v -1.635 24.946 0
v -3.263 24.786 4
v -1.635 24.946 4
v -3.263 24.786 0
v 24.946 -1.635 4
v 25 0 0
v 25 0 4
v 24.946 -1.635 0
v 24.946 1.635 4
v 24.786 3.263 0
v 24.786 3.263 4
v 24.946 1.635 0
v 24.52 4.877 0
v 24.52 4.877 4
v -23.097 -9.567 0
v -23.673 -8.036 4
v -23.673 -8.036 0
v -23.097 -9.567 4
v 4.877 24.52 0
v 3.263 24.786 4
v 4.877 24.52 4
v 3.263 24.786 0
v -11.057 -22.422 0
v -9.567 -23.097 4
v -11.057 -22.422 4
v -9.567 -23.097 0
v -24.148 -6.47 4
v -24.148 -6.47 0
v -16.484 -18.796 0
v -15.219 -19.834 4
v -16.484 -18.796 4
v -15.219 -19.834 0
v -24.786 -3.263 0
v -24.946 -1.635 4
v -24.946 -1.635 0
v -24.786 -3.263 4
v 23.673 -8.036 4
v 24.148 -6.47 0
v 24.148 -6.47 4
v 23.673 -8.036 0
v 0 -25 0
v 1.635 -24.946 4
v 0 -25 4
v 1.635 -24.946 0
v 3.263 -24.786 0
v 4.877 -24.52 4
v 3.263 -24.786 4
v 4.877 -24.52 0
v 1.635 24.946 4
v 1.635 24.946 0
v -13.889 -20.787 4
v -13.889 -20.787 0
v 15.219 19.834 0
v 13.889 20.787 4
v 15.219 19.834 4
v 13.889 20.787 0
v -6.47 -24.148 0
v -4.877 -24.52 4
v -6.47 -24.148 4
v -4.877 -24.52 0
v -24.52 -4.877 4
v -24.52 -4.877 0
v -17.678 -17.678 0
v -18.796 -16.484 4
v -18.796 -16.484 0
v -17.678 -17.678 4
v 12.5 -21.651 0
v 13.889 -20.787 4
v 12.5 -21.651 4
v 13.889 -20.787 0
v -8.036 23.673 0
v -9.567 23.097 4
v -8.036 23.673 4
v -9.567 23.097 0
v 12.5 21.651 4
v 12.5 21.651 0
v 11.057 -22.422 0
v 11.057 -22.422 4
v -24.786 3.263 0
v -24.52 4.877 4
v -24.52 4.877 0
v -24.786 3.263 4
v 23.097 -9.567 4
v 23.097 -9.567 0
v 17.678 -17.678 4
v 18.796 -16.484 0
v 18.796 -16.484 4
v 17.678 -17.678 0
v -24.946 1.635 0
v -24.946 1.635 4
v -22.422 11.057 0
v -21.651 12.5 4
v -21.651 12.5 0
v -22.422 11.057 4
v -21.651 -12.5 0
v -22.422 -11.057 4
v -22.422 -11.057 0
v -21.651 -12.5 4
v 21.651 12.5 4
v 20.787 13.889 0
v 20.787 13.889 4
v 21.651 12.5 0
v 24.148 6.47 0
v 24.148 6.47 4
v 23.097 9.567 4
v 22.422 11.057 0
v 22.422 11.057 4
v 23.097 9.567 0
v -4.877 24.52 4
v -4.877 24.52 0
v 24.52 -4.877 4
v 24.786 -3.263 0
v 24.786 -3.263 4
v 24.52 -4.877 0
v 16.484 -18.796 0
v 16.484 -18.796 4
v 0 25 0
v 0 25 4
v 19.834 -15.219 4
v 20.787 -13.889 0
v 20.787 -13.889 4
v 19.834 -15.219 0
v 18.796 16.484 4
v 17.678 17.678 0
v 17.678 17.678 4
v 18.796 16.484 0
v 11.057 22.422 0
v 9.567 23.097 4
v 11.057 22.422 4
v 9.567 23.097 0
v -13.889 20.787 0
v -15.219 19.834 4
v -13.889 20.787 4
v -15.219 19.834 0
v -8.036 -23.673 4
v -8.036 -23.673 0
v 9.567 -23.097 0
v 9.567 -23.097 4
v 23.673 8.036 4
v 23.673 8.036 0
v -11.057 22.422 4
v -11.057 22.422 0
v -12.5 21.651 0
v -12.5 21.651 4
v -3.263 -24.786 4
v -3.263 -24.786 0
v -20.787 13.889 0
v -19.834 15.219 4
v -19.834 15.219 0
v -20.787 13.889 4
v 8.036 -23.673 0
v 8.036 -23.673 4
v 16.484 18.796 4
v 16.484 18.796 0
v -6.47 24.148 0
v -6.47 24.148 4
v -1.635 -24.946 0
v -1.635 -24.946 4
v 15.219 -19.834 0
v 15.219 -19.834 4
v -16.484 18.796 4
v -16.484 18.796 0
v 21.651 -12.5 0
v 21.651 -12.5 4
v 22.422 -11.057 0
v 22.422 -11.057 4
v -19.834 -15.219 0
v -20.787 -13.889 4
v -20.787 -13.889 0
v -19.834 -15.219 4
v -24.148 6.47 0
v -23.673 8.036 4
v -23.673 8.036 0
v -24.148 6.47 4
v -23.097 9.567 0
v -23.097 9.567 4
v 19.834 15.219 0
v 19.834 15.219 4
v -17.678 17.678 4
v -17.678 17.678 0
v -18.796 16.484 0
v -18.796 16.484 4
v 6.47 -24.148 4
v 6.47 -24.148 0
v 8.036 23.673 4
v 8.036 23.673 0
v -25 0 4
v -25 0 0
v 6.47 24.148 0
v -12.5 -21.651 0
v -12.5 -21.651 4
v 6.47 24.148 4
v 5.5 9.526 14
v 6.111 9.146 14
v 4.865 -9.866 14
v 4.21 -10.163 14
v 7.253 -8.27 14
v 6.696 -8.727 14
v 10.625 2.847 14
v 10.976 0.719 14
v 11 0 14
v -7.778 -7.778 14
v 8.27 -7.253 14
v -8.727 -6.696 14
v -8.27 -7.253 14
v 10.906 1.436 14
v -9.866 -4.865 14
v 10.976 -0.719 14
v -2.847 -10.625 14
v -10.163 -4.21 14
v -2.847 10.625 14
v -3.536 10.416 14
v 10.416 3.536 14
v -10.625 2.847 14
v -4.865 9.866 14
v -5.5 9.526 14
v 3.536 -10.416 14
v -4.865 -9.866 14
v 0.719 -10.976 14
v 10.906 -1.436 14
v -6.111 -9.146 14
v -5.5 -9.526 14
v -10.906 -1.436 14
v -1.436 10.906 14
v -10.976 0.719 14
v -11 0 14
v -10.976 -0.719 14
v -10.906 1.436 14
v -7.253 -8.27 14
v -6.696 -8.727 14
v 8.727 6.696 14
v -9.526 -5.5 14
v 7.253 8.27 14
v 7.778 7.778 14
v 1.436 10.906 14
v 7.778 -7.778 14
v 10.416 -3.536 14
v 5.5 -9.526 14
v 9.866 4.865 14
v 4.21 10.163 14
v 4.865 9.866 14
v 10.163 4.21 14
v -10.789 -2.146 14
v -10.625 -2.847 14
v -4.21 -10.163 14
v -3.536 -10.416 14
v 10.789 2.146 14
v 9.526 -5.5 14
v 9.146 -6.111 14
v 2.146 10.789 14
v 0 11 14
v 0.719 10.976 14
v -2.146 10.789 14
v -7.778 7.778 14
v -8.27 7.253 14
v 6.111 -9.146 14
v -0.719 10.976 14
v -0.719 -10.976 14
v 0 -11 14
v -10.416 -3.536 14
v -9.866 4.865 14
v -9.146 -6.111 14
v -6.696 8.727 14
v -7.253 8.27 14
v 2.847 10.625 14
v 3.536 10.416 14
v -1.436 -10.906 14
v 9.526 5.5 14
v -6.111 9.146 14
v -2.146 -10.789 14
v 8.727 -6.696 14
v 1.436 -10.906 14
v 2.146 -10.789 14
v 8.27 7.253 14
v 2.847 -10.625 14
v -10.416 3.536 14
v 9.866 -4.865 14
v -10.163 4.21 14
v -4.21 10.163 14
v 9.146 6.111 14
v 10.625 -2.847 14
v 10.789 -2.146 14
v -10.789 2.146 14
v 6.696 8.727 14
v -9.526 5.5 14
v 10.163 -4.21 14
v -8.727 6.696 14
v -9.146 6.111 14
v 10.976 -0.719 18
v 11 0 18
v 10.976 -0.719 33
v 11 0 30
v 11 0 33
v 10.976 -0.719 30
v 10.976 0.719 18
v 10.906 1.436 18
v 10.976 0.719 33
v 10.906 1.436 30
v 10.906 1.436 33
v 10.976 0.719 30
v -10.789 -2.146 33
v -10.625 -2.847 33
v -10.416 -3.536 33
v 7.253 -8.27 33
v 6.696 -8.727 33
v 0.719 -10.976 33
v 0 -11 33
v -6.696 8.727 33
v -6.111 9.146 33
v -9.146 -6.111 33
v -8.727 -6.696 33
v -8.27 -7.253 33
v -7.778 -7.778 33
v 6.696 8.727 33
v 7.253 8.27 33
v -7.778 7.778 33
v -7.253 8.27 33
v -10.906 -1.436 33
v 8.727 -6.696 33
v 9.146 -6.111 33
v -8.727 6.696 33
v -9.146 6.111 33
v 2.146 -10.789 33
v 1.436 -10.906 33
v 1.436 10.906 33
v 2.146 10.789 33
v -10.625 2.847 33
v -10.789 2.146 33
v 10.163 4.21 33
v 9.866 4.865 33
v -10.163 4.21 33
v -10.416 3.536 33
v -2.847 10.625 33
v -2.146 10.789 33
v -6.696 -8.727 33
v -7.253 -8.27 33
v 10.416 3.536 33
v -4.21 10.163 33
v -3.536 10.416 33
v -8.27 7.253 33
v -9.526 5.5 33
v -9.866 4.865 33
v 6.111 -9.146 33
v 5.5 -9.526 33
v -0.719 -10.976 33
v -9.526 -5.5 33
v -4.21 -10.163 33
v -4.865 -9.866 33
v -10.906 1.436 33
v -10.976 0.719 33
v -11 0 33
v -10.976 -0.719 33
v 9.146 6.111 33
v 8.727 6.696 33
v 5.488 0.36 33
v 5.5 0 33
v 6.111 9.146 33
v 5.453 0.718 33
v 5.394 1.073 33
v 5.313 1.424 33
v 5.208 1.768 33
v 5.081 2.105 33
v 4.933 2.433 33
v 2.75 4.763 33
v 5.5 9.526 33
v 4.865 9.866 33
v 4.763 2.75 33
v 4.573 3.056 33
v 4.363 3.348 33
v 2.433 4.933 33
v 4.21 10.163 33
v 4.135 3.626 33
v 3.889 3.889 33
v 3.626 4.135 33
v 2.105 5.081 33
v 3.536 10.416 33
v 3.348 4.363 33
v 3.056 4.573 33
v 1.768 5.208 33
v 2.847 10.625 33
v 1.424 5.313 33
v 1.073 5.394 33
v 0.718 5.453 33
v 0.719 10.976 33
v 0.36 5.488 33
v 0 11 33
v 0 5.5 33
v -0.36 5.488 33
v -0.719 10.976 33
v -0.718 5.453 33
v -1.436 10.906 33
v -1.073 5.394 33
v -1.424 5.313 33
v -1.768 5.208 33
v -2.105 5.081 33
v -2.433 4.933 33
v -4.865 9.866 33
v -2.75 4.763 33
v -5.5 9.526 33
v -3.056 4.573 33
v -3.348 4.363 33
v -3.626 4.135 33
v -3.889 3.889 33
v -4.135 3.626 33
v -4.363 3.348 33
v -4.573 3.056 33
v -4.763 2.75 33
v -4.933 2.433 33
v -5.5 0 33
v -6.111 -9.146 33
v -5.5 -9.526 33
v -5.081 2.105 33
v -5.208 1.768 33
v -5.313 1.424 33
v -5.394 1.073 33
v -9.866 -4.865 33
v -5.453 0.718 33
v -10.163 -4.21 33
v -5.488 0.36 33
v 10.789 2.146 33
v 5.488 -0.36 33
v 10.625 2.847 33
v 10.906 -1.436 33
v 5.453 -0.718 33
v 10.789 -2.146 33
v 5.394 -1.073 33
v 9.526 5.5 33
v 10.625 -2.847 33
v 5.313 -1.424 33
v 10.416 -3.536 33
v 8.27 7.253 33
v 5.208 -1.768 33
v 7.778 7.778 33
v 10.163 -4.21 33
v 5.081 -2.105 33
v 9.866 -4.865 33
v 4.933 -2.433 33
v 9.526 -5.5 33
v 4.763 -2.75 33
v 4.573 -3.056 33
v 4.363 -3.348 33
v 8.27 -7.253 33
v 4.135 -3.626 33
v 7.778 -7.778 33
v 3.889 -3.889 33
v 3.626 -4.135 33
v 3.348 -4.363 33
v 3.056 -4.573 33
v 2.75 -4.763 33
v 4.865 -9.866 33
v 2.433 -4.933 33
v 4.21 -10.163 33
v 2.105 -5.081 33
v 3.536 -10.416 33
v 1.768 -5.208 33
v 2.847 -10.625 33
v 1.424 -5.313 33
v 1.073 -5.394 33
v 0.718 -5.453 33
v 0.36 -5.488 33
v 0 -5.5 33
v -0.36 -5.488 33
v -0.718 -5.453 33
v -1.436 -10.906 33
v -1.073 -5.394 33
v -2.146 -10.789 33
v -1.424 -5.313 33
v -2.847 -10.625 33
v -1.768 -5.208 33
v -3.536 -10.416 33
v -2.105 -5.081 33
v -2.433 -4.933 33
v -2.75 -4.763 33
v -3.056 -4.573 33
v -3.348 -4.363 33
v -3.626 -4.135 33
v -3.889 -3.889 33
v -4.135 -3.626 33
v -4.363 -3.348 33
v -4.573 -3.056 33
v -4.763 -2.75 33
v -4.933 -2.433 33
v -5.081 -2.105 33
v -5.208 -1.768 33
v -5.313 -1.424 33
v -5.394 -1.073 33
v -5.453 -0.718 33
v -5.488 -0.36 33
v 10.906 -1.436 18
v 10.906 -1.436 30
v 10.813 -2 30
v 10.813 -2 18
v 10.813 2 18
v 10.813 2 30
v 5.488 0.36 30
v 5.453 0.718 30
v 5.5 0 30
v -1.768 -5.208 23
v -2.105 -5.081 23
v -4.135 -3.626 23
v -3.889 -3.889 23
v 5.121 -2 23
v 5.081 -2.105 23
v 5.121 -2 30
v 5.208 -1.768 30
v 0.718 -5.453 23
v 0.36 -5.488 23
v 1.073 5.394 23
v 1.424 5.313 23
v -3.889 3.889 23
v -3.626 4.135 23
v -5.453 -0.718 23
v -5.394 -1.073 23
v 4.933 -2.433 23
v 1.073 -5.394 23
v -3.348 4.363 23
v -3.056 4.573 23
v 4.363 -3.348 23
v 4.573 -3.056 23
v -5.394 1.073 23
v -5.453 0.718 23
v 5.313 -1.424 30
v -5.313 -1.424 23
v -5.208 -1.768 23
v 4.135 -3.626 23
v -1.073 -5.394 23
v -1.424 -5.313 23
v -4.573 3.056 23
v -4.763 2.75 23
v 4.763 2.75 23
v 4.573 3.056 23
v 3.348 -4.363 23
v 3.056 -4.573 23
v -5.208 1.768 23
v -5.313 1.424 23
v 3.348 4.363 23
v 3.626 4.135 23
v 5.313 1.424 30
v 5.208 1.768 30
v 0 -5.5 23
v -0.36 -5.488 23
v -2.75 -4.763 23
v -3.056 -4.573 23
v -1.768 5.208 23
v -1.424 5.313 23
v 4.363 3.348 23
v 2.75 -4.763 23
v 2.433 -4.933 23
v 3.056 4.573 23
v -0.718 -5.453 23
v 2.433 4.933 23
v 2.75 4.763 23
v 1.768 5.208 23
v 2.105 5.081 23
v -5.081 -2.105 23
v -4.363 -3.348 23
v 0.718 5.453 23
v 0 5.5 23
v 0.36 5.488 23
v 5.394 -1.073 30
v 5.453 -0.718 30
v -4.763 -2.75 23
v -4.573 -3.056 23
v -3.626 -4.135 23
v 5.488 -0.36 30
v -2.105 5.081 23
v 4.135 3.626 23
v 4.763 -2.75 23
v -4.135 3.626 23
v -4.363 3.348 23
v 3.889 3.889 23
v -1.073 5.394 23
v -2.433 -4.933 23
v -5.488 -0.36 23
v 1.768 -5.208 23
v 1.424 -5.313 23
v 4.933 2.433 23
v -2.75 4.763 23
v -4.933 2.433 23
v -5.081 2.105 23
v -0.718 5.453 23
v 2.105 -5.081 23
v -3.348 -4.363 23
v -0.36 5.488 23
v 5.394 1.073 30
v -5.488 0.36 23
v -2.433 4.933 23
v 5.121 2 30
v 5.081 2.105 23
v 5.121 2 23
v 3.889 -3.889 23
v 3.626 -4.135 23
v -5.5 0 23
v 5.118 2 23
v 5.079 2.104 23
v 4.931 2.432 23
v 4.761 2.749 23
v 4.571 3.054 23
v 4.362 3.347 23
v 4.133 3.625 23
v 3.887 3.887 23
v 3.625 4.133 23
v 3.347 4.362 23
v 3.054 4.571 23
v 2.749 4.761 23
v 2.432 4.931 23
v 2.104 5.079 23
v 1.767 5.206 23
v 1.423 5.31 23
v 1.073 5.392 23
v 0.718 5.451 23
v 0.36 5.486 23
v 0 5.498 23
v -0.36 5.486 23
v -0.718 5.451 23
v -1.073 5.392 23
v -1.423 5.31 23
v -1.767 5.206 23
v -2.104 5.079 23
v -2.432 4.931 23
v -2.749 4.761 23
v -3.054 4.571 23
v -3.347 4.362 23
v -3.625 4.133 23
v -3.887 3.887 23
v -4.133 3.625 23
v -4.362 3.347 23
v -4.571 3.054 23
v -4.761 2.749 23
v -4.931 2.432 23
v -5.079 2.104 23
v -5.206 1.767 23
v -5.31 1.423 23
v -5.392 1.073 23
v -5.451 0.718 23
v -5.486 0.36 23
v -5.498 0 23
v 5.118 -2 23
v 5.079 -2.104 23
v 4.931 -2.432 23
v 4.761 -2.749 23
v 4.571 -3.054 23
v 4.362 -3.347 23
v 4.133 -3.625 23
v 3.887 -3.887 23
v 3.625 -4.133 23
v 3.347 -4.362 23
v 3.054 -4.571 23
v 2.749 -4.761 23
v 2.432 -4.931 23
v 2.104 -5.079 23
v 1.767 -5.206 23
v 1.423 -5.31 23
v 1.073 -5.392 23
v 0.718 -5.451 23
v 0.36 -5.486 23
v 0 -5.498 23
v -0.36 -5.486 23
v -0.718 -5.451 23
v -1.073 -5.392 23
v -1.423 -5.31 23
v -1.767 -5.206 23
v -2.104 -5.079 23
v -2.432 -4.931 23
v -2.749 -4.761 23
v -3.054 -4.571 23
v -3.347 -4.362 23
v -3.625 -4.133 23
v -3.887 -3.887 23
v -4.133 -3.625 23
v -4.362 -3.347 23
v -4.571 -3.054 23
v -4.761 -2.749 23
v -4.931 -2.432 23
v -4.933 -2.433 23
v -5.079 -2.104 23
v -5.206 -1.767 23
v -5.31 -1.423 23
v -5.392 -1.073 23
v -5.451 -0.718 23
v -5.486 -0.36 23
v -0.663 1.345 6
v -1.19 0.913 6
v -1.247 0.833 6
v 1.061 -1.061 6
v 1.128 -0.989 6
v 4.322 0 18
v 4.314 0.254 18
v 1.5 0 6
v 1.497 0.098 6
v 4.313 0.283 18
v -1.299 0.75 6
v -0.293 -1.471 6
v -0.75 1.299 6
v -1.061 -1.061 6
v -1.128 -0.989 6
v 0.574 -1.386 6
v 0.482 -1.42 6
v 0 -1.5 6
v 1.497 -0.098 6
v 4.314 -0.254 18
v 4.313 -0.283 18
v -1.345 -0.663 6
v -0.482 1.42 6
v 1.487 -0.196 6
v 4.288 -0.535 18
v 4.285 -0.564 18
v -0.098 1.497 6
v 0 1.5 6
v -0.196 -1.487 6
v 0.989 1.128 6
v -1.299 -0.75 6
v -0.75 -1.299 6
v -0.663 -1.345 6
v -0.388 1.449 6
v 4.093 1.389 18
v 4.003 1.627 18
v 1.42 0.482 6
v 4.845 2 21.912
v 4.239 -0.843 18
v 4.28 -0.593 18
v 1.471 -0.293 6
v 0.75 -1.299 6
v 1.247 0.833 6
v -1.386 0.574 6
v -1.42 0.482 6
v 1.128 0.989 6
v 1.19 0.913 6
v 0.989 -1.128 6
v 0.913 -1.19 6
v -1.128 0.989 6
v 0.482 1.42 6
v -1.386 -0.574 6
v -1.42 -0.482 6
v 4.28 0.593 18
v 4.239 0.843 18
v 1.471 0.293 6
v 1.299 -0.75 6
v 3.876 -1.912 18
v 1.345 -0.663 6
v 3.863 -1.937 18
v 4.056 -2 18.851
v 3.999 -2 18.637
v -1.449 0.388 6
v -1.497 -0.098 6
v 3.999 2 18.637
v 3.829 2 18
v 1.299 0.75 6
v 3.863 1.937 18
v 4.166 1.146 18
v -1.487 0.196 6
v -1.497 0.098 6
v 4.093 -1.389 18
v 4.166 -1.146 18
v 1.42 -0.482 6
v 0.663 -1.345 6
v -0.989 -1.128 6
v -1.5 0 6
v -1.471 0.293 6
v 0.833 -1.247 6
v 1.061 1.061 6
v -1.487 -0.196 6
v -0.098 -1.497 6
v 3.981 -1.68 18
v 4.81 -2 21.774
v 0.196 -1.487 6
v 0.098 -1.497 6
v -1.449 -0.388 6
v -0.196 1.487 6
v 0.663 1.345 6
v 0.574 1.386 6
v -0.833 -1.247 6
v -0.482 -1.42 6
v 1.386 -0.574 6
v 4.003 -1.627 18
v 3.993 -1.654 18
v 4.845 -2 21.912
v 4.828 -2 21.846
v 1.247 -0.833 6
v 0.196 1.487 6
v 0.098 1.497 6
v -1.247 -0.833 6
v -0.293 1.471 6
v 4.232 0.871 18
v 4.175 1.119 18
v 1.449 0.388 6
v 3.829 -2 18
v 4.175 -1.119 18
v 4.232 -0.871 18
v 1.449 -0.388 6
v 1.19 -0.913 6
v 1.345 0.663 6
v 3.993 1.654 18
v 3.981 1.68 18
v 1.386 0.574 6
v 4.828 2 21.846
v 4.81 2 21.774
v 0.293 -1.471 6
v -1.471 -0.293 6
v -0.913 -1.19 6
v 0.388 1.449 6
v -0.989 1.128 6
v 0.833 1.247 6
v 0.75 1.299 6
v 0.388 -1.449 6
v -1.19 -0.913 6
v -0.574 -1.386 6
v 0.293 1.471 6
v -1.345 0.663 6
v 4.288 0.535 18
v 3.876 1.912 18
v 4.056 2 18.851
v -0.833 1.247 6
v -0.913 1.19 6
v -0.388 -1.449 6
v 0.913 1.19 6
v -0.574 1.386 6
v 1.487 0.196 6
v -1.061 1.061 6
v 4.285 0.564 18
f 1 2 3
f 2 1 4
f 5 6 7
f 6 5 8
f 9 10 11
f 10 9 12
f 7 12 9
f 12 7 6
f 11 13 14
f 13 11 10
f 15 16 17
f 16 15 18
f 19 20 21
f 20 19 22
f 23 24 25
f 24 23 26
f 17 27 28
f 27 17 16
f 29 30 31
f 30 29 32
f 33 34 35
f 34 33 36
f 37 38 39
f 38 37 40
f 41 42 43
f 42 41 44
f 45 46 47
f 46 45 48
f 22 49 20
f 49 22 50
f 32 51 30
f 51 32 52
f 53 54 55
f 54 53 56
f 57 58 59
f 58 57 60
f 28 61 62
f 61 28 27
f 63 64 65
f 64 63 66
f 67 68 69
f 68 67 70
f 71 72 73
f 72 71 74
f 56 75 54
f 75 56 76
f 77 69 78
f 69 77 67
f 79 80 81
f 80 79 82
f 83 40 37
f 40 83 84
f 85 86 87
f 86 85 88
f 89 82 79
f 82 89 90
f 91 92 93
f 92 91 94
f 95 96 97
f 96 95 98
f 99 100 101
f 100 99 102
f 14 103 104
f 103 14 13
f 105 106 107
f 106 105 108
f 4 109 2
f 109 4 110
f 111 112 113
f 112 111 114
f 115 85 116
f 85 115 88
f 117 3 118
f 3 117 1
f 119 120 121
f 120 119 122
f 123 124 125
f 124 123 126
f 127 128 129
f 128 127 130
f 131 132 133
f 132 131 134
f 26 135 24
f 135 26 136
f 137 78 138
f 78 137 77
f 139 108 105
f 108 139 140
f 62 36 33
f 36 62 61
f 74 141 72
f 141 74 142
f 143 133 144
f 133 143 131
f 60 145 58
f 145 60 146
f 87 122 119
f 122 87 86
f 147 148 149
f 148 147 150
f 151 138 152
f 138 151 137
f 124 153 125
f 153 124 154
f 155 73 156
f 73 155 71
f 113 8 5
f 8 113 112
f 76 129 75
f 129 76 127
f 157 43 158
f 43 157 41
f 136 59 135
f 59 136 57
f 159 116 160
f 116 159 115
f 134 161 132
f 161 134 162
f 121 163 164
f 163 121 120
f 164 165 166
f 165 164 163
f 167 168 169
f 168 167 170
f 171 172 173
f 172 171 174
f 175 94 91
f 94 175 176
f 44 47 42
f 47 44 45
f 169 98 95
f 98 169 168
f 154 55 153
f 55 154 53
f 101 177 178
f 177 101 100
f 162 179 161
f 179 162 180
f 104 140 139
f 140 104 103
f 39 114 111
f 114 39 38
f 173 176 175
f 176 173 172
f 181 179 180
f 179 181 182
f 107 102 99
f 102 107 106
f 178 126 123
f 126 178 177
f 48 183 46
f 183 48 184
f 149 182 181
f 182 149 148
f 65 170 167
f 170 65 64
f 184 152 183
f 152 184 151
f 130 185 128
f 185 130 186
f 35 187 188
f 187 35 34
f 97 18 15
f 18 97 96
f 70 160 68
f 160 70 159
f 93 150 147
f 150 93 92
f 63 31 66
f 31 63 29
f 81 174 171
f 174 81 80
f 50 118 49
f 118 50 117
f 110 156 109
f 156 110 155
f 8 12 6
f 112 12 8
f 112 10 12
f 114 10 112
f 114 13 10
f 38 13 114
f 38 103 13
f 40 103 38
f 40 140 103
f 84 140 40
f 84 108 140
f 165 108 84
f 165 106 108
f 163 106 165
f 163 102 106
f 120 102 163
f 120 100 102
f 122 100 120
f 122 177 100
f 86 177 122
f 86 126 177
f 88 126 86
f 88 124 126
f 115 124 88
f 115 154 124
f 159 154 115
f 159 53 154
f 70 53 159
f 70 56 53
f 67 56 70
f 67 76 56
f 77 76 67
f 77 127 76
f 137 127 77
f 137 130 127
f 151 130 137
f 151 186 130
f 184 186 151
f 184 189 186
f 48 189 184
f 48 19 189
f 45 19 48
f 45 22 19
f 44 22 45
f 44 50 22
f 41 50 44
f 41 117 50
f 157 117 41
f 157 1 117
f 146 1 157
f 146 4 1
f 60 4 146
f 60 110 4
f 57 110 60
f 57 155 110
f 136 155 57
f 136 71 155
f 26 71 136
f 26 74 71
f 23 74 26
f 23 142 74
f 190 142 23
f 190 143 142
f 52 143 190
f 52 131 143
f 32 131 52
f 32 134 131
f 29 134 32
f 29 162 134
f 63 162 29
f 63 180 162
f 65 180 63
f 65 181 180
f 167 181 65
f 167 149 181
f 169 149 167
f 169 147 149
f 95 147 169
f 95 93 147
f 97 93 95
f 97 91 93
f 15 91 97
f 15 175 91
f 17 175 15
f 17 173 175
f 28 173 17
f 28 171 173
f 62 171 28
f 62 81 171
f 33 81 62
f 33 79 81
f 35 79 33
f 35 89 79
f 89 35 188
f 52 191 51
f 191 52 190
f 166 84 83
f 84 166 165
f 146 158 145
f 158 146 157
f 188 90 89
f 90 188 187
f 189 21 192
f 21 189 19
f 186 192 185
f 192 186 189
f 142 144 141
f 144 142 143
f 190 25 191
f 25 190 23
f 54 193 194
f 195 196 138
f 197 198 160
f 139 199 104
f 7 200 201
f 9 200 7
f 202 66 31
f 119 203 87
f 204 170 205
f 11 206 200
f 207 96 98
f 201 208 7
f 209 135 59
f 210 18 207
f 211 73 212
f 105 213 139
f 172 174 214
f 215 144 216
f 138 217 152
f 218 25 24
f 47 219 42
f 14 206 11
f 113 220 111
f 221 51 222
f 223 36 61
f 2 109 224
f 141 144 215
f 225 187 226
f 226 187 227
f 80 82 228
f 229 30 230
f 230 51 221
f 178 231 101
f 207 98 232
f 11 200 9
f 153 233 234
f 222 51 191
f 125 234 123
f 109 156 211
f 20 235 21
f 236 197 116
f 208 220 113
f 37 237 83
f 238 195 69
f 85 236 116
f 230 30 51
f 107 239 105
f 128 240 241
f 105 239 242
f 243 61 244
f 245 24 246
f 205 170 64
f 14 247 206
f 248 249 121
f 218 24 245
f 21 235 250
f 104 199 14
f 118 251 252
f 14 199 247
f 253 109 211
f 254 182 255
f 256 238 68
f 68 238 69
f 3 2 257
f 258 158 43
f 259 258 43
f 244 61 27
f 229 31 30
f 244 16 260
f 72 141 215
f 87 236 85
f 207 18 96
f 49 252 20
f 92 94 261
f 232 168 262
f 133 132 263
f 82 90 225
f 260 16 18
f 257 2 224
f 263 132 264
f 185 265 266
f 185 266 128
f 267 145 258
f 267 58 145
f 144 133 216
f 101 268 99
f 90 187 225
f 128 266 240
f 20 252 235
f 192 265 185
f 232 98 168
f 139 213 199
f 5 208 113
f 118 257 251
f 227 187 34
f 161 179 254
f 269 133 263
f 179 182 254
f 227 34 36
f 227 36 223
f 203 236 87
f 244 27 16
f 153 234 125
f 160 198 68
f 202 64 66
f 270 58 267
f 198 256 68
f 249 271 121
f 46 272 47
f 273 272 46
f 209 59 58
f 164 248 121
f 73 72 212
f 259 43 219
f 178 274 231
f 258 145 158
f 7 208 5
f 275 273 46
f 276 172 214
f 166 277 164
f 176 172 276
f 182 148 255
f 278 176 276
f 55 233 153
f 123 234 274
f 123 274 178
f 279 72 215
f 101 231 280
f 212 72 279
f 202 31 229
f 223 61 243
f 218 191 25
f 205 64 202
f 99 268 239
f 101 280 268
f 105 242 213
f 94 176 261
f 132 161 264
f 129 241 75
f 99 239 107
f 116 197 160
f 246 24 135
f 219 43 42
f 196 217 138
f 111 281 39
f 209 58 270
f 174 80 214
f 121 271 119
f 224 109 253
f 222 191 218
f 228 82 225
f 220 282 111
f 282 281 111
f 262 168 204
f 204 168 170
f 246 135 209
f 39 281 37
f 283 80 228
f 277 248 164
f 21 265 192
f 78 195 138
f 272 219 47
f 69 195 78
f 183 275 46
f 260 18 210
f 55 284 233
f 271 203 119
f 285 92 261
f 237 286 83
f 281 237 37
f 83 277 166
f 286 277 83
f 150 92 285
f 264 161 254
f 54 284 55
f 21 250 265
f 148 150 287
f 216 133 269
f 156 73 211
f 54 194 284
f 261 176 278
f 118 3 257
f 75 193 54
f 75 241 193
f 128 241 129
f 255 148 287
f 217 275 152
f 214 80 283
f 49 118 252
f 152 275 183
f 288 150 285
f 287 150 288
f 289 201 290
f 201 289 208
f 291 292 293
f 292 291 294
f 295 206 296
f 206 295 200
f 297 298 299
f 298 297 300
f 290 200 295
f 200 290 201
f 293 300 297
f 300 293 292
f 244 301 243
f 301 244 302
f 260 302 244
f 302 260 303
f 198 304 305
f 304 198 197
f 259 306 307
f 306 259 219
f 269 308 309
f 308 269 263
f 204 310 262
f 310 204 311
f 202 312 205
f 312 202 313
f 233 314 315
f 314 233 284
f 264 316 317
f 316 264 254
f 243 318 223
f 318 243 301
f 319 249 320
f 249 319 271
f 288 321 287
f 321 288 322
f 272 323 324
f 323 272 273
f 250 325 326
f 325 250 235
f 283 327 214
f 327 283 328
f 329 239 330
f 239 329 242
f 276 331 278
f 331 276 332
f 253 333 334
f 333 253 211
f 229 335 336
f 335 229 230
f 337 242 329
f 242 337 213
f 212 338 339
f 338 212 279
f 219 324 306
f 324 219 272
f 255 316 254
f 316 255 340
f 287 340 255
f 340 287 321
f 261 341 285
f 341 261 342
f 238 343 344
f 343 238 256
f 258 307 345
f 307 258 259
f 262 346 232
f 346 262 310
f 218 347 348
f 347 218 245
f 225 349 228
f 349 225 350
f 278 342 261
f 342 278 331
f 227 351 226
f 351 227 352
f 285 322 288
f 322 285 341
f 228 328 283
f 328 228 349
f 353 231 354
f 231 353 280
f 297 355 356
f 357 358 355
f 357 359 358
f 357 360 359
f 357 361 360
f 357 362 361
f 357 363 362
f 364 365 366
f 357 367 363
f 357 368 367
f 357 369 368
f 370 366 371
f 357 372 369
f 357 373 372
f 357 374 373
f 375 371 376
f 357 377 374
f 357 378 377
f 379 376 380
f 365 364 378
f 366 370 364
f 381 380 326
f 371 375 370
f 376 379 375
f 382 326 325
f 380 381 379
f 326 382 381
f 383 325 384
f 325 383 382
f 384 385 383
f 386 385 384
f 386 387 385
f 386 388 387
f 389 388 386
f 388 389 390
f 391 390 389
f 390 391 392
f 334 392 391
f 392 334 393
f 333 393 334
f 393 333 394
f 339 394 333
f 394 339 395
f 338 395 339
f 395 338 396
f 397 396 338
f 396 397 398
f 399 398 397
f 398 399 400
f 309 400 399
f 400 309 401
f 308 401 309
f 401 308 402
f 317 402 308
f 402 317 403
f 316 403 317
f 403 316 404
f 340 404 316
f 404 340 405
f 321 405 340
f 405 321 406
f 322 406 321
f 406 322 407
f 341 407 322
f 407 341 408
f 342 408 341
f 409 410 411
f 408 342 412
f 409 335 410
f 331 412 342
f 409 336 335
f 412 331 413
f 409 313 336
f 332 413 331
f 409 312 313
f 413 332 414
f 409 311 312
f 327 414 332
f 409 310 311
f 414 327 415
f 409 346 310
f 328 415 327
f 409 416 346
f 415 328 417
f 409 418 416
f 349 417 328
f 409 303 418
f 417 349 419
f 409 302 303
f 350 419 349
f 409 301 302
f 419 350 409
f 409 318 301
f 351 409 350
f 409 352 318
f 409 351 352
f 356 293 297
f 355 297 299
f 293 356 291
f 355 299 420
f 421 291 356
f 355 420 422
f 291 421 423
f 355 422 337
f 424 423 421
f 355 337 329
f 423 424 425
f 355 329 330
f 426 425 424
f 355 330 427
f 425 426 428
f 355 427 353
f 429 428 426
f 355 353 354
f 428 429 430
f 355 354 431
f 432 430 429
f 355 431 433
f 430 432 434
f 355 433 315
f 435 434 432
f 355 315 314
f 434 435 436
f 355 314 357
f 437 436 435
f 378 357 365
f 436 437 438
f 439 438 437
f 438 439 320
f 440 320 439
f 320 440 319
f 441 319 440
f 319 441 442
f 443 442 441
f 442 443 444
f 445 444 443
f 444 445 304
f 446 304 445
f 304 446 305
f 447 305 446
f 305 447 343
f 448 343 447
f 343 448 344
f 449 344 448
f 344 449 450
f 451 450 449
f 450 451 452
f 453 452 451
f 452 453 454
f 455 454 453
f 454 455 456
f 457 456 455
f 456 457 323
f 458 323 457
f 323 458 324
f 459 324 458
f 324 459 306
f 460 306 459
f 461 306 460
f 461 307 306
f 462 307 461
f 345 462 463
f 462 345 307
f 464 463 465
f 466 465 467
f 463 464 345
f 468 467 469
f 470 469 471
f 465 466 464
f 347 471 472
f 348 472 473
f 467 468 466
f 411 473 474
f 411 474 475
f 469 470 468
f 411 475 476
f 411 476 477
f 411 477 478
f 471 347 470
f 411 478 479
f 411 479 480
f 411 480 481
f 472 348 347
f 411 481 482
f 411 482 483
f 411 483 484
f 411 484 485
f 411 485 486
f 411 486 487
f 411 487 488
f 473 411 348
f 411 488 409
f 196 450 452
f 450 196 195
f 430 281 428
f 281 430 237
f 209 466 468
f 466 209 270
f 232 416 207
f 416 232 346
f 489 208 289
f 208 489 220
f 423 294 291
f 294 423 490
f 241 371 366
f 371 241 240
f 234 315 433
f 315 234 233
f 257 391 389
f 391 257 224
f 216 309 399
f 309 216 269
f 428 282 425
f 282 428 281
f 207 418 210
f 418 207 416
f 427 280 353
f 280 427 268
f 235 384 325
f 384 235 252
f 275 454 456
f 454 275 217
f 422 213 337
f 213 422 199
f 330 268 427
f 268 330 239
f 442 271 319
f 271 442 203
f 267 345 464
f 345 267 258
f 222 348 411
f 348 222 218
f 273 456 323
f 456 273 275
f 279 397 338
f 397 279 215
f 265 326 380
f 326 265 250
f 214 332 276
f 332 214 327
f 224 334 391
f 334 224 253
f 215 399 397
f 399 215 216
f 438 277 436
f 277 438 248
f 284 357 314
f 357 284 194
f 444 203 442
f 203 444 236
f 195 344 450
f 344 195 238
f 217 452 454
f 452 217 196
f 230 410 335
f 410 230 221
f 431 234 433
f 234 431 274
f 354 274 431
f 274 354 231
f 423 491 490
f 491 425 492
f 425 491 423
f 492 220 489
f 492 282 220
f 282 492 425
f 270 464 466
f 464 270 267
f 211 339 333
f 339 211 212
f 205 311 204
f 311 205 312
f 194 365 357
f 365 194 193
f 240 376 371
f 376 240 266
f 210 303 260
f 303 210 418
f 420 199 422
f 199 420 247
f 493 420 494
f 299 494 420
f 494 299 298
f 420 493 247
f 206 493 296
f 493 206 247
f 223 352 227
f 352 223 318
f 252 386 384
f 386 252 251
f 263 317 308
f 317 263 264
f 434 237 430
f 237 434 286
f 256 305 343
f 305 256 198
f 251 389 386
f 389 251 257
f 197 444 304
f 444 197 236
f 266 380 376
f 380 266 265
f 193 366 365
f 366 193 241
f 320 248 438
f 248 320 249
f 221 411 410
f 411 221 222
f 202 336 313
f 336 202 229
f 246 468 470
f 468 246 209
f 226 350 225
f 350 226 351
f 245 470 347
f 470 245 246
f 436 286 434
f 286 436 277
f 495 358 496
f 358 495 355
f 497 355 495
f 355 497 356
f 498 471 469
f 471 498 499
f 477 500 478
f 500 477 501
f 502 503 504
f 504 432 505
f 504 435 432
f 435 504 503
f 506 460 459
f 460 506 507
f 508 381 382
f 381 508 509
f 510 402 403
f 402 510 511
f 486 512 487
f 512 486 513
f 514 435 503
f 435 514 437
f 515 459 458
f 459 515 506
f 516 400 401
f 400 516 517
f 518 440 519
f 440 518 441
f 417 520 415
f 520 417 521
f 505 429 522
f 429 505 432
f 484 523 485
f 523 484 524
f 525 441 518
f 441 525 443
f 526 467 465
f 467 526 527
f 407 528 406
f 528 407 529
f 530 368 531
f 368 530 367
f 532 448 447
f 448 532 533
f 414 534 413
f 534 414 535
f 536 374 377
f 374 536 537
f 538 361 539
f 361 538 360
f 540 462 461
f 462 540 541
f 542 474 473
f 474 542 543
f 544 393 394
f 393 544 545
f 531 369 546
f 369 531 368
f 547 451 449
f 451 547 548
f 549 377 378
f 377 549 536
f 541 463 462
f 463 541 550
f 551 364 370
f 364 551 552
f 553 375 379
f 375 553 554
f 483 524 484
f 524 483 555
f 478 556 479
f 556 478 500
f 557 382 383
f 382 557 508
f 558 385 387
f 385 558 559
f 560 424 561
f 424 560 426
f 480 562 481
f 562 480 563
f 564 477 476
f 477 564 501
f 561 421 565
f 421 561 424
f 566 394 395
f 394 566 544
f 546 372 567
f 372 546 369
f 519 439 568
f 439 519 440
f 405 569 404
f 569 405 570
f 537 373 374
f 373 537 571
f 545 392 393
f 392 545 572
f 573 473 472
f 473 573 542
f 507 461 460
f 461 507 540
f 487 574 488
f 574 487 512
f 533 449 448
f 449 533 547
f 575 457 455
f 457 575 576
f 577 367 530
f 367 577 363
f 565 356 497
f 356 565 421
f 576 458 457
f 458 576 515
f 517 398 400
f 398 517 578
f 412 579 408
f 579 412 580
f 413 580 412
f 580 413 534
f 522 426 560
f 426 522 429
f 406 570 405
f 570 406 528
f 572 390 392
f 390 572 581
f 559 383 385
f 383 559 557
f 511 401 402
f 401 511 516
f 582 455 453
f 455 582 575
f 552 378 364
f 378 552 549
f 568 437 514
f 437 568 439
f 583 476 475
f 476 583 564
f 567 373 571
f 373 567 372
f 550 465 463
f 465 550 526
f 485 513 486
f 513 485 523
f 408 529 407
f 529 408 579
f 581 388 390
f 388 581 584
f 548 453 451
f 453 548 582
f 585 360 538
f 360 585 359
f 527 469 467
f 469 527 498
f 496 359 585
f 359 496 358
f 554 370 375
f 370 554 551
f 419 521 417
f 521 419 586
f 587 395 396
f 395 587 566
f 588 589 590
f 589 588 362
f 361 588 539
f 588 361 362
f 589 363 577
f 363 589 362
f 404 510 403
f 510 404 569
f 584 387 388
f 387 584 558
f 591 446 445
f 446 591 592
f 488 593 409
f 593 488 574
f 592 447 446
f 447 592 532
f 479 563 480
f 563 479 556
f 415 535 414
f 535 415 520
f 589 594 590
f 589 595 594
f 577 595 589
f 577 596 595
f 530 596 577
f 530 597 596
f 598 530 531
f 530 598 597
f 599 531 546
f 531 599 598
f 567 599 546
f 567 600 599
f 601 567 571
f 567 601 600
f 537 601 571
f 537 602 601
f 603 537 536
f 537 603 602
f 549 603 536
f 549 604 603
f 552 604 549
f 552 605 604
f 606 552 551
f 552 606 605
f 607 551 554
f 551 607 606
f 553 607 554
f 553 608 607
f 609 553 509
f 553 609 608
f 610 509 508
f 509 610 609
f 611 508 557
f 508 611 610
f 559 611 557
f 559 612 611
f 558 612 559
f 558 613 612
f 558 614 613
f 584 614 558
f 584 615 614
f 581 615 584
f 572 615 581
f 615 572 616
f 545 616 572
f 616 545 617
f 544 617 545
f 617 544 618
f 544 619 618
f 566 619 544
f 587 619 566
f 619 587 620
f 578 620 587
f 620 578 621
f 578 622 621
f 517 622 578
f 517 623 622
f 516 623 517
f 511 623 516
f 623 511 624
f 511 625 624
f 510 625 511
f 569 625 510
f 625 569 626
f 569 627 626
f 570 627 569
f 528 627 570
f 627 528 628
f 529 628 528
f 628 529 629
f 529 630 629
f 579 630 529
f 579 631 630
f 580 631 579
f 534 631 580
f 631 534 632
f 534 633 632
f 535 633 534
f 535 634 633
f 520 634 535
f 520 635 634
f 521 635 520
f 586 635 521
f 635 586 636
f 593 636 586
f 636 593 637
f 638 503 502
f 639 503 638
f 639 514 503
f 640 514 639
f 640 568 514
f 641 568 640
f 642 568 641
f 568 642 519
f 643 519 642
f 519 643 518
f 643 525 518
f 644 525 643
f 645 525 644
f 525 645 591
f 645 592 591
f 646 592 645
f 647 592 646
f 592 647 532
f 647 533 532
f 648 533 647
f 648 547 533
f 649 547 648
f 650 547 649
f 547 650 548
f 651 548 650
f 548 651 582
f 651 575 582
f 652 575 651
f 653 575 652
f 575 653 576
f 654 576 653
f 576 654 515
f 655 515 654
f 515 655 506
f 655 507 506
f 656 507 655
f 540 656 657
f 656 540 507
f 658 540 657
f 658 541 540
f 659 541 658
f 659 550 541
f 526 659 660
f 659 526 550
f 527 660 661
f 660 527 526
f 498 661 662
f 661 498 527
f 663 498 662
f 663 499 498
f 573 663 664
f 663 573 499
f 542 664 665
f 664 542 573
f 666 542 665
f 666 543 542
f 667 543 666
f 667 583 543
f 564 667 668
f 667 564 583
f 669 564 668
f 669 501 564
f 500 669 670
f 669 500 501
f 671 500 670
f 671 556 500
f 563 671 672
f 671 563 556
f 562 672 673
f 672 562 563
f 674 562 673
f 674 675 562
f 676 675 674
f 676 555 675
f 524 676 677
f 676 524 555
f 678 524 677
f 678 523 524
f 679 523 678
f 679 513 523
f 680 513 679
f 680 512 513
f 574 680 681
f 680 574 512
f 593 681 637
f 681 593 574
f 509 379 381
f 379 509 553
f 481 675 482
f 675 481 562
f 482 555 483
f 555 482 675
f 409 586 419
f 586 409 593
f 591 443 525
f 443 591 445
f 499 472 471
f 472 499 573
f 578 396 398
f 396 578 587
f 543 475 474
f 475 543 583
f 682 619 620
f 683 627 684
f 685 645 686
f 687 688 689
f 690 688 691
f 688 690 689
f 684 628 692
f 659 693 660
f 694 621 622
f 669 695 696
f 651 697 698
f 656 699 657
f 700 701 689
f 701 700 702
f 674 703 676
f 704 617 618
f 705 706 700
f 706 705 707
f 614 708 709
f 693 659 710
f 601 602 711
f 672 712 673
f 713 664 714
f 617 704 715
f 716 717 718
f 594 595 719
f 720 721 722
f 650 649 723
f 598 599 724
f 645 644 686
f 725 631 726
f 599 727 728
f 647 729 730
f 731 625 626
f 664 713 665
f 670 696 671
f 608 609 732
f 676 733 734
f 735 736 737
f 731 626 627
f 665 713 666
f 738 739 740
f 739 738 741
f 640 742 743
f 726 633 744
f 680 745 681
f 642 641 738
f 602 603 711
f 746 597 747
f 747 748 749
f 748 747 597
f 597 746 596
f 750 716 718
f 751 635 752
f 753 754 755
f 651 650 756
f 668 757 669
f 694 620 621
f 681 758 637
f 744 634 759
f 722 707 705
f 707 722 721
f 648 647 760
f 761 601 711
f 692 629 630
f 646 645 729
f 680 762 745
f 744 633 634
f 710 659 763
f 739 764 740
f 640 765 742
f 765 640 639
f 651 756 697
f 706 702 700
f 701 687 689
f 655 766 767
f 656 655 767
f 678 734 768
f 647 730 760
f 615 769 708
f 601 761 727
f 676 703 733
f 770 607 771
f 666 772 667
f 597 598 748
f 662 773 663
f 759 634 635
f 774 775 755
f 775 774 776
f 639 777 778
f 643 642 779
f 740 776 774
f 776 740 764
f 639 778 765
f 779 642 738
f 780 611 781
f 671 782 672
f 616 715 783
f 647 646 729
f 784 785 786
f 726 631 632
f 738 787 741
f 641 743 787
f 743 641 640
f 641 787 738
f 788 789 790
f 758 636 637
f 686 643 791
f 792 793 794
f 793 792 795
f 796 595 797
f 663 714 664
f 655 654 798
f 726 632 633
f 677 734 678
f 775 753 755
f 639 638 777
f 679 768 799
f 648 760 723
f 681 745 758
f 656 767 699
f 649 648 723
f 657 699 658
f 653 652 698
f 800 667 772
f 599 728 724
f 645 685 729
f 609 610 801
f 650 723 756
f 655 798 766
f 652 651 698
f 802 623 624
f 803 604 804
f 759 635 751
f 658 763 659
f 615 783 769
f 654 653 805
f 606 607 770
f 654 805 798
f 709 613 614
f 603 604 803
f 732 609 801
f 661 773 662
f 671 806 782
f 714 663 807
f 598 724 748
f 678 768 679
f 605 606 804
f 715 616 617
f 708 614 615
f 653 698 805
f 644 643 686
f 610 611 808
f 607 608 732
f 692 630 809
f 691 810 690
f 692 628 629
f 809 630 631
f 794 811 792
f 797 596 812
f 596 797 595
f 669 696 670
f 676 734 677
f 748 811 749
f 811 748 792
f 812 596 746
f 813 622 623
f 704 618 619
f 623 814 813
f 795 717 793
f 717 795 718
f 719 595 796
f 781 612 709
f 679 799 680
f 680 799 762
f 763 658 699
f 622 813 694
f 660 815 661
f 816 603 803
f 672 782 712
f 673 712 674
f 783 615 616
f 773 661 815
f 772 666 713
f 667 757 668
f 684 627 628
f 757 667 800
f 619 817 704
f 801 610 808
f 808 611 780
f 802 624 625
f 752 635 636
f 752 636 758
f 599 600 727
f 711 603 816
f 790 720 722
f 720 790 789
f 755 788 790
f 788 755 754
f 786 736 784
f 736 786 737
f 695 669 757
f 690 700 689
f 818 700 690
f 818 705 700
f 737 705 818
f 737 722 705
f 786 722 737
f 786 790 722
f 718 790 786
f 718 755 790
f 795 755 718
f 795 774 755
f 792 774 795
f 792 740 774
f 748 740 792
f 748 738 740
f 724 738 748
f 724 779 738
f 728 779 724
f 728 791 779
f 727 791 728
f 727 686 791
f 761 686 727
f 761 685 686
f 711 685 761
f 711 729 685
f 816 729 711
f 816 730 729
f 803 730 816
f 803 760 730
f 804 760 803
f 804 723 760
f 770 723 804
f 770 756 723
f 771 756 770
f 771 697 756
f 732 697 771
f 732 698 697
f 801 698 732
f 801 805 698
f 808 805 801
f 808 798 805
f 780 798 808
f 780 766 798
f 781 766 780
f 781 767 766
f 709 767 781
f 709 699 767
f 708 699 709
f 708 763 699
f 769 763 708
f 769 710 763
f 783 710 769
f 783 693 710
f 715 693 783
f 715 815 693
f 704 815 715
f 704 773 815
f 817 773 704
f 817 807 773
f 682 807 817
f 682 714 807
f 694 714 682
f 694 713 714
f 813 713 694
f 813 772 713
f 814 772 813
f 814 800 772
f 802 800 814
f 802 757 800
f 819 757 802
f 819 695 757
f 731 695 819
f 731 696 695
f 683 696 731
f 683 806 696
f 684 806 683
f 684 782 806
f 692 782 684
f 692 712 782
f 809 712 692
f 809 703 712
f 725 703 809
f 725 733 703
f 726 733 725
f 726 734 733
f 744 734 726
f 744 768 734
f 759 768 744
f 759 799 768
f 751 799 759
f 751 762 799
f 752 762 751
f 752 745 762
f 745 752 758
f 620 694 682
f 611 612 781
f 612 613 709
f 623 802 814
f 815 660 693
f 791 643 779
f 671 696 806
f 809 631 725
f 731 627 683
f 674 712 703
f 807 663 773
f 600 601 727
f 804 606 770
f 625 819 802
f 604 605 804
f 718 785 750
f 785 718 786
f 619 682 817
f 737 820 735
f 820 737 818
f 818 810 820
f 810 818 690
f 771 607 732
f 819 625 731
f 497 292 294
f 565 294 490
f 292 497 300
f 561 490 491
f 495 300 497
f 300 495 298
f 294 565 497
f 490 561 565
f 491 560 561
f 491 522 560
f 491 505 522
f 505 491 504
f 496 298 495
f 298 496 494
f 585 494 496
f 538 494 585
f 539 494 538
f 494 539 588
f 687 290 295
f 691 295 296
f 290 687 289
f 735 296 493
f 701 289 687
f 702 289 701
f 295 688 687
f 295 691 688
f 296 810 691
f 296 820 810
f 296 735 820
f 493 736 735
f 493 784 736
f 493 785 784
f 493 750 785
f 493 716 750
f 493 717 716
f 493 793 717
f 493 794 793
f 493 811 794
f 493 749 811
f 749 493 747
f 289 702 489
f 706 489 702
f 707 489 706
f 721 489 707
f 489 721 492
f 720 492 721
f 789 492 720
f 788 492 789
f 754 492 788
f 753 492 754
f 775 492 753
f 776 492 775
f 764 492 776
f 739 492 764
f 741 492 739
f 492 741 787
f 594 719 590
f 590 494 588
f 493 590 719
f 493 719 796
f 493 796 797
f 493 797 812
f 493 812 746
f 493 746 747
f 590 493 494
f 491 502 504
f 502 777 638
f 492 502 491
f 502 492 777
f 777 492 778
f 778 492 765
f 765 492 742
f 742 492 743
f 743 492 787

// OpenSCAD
// Analytical balance stand for one 1.5 mL microcentrifuge tube
// Print orientation: standing upright, base on the bed (z = 0)

$fn = 96;

// ---------- Outer body ----------
base_d      = 50;   // base disc diameter
base_h      = 4;    // base disc top (z = 0 .. 4)
cone_top_z  = 14;   // outer cone ends here (50 -> 22 mm)
col_d       = 22;   // column diameter
col_top_z   = 33;   // overall height (top of column)

// ---------- Tube seat ----------
seat_d       = 11;  // cylindrical seat diameter
seat_cyl_z   = 23;  // bottom of cylindrical seat portion
seat_tip_d   = 3;   // diameter at the bottom of the conical tip
seat_tip_z   = 6;   // bottom of the conical tip (solid below)

// ---------- Viewing window ----------
win_w       = 4;    // window width in Y
win_z0      = 18;   // window bottom
win_z1      = 30;   // window top

eps = 0.5;          // cutter overlap past faces

difference() {
    // Outer body
    union() {
        cylinder(d = base_d, h = base_h);
        translate([0, 0, base_h])
            cylinder(d1 = base_d, d2 = col_d, h = cone_top_z - base_h);
        translate([0, 0, cone_top_z])
            cylinder(d = col_d, h = col_top_z - cone_top_z);
    }

    // Cylindrical part of seat (extends above top)
    translate([0, 0, seat_cyl_z])
        cylinder(d = seat_d, h = col_top_z - seat_cyl_z + eps);

    // Conical tip of seat (slight overlap into cylinder to avoid coplanar faces)
    translate([0, 0, seat_tip_z])
        cylinder(d1 = seat_tip_d, d2 = seat_d, h = seat_cyl_z - seat_tip_z + 0.01);

    // Viewing window through +X wall, from axis to outside
    translate([0, -win_w / 2, win_z0])
        cube([col_d / 2 + eps, win_w, win_z1 - win_z0]);
}
